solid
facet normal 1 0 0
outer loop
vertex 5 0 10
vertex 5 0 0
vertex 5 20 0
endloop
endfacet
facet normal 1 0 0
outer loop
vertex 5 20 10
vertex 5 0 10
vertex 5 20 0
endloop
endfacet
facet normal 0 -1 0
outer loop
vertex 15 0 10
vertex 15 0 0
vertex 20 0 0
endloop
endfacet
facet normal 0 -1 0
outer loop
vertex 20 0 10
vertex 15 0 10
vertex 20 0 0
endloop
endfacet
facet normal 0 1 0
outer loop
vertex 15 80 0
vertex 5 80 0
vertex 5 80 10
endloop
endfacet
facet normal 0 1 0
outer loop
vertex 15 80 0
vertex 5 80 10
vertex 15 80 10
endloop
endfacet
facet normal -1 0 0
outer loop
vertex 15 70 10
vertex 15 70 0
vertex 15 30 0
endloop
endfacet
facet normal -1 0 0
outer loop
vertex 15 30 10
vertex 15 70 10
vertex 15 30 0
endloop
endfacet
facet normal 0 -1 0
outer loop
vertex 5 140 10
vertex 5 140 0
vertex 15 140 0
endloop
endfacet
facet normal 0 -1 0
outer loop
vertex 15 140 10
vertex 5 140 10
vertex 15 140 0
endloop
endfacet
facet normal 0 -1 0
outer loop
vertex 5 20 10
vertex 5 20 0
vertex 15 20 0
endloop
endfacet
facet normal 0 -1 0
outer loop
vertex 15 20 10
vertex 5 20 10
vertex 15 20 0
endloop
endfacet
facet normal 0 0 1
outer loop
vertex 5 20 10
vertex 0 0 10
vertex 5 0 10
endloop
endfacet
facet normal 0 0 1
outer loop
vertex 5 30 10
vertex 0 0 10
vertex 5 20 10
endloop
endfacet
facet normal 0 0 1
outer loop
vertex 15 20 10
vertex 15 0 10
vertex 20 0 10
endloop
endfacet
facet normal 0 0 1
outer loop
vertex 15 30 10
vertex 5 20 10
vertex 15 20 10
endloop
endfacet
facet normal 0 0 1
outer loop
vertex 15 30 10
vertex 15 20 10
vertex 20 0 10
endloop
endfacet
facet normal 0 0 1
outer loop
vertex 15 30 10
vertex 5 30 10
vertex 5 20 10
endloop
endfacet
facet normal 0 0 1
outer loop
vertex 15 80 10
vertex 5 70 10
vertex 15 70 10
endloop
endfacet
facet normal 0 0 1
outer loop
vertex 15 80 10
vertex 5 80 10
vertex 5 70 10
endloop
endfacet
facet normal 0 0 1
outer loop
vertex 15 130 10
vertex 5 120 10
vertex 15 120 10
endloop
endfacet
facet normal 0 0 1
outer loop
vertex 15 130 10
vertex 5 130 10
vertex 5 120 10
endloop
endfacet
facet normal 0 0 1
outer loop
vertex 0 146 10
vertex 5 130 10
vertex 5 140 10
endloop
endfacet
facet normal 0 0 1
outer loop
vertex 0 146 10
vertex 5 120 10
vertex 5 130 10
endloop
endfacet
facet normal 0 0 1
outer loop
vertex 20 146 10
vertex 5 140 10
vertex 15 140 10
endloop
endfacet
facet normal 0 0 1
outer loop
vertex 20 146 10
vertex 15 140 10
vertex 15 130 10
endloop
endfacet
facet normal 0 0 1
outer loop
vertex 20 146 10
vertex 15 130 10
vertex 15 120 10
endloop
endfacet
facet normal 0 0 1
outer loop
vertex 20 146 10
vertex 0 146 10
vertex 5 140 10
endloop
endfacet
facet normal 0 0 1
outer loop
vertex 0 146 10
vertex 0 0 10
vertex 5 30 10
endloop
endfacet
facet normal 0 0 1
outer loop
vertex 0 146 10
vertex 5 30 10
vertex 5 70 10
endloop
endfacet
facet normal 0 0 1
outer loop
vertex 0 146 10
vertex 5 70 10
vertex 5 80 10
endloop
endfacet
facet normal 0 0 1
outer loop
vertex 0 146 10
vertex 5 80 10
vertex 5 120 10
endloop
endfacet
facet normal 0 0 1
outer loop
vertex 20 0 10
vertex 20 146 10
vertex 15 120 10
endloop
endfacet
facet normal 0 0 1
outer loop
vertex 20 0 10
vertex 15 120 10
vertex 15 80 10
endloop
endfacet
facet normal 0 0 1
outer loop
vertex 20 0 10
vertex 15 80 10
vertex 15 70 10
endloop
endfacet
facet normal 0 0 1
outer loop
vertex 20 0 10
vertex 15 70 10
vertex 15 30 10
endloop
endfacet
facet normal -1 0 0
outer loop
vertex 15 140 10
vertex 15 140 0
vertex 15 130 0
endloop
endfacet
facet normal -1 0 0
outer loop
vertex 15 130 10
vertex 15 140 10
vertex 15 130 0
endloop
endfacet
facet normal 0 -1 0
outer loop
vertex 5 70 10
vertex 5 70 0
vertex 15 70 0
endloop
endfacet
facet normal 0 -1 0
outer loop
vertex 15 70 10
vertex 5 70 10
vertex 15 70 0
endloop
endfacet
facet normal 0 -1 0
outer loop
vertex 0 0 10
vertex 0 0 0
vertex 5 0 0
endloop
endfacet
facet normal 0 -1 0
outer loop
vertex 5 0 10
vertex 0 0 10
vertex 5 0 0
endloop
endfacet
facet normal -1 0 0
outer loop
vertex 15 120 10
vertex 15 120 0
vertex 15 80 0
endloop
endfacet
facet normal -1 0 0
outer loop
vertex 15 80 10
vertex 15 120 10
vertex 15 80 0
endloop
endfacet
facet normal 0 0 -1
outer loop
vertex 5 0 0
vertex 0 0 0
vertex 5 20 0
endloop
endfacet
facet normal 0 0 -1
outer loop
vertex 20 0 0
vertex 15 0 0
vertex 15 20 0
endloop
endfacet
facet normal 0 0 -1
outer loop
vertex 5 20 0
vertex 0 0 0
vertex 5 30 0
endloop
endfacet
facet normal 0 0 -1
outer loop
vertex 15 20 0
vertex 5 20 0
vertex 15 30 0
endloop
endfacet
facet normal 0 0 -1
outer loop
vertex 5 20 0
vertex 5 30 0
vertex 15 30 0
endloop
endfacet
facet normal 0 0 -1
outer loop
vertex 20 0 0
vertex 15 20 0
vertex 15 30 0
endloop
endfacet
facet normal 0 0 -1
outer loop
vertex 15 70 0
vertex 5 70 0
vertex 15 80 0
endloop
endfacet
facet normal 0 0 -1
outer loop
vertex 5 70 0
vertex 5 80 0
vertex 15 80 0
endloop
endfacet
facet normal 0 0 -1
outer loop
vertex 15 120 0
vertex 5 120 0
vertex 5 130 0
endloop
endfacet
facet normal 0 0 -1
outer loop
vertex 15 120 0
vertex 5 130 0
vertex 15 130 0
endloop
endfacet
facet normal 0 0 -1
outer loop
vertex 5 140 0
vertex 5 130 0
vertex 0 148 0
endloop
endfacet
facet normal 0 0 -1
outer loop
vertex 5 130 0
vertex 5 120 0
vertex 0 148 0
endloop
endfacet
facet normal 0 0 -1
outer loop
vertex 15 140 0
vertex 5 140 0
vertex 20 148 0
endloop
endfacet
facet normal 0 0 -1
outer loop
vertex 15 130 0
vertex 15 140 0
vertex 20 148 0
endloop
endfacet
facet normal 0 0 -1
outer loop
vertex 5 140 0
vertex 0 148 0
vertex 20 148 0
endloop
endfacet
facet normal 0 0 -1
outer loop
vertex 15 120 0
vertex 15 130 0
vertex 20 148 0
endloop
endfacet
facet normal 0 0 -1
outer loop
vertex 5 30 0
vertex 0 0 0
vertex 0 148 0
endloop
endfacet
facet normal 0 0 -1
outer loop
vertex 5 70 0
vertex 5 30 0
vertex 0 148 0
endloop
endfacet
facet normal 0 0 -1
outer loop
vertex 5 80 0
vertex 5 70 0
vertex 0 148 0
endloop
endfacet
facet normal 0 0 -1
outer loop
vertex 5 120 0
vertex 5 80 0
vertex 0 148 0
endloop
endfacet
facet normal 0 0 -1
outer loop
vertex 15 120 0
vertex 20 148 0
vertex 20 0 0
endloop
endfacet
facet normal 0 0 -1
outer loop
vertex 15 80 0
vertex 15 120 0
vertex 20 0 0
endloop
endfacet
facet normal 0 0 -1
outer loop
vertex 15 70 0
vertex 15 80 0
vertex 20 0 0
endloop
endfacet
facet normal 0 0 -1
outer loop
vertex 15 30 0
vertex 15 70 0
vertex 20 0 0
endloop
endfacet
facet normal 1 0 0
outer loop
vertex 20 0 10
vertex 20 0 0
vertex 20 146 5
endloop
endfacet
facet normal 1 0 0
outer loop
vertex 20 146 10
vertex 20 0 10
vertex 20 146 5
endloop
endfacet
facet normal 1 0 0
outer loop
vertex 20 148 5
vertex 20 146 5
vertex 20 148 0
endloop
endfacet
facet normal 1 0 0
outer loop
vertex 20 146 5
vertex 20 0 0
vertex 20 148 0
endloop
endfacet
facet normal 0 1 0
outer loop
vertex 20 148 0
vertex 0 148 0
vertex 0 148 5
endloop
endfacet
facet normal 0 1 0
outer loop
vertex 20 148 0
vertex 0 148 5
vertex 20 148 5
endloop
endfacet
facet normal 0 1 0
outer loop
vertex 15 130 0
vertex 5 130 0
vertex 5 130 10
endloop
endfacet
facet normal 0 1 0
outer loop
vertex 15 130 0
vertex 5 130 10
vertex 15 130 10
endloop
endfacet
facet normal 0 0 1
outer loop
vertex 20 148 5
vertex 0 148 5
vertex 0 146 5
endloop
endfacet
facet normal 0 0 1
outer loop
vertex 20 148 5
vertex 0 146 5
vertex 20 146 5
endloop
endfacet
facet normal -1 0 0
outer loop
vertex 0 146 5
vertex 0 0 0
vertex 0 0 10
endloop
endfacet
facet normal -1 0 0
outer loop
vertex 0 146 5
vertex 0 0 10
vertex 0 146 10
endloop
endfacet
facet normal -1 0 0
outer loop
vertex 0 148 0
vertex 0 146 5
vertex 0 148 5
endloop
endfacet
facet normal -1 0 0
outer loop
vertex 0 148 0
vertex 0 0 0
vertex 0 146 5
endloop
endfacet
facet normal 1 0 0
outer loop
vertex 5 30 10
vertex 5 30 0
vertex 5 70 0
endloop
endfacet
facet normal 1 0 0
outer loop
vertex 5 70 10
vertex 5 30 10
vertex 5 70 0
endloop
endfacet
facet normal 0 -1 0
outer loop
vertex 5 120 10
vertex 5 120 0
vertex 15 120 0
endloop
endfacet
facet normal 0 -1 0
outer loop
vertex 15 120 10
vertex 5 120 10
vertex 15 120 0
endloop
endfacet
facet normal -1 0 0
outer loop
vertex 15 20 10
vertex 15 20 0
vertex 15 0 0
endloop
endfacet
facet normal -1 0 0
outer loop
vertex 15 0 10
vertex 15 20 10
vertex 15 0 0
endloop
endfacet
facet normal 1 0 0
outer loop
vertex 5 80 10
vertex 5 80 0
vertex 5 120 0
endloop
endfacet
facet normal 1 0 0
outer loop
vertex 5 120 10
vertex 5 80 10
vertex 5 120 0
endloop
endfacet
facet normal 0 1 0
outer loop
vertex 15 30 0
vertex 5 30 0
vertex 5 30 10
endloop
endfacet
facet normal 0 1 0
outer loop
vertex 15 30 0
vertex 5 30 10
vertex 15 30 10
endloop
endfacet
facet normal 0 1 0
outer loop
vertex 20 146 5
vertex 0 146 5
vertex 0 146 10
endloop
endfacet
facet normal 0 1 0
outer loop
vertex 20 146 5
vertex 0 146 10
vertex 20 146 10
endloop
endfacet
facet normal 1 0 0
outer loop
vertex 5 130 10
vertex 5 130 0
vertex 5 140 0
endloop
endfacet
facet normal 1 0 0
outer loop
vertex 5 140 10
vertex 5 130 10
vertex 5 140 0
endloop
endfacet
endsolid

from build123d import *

# Parameters (mm, degrees)
F0_W     = 10
F0_H     = 10
F1_DEPTH = 10
F2_W     = 10
F2_H     = 10
F3_DEPTH = 10
F4_W     = 20
F4_H     = 8
F5_DEPTH = 5
F6_W     = 20
F6_H     = 6
F7_DEPTH = 5


with BuildPart() as f1:
    # F0 (on Top) → F1 (new body)
    with BuildSketch(Plane.XY):
        Polygon((0, 140), (0, 0), (5, 0), (5, 20), (5, 30), (5, 70), (5, 80), (5, 120), (5, 130), (5, 140), align=None)
        with Locations((10, 25)):
            Rectangle(F0_W, F0_H)
        Polygon((15, 30), (15, 20), (15, 0), (20, 0), (20, 140), (15, 140), (15, 130), (15, 120), (15, 80), (15, 70), align=None)
        with Locations((10, 125)):
            Rectangle(F0_W, F0_H)
    extrude(amount=F1_DEPTH)

    # F2 (on Top) → F3 (join)
    with BuildSketch(Plane.XY):
        with Locations((10, 75)):
            Rectangle(F2_W, F2_H)
    extrude(amount=F3_DEPTH)

    # F4 (on Top) → F5 (join)
    with BuildSketch(Plane.XY):
        with Locations((10, 144)):
            Rectangle(F4_W, F4_H)
    extrude(amount=F5_DEPTH)

    # F6 (on face) → F7 (join)
    with BuildSketch(Plane.XY.offset(5)):
        with Locations((10, 143)):
            Rectangle(F6_W, F6_H)
    extrude(amount=F7_DEPTH)


solid = f1.part
